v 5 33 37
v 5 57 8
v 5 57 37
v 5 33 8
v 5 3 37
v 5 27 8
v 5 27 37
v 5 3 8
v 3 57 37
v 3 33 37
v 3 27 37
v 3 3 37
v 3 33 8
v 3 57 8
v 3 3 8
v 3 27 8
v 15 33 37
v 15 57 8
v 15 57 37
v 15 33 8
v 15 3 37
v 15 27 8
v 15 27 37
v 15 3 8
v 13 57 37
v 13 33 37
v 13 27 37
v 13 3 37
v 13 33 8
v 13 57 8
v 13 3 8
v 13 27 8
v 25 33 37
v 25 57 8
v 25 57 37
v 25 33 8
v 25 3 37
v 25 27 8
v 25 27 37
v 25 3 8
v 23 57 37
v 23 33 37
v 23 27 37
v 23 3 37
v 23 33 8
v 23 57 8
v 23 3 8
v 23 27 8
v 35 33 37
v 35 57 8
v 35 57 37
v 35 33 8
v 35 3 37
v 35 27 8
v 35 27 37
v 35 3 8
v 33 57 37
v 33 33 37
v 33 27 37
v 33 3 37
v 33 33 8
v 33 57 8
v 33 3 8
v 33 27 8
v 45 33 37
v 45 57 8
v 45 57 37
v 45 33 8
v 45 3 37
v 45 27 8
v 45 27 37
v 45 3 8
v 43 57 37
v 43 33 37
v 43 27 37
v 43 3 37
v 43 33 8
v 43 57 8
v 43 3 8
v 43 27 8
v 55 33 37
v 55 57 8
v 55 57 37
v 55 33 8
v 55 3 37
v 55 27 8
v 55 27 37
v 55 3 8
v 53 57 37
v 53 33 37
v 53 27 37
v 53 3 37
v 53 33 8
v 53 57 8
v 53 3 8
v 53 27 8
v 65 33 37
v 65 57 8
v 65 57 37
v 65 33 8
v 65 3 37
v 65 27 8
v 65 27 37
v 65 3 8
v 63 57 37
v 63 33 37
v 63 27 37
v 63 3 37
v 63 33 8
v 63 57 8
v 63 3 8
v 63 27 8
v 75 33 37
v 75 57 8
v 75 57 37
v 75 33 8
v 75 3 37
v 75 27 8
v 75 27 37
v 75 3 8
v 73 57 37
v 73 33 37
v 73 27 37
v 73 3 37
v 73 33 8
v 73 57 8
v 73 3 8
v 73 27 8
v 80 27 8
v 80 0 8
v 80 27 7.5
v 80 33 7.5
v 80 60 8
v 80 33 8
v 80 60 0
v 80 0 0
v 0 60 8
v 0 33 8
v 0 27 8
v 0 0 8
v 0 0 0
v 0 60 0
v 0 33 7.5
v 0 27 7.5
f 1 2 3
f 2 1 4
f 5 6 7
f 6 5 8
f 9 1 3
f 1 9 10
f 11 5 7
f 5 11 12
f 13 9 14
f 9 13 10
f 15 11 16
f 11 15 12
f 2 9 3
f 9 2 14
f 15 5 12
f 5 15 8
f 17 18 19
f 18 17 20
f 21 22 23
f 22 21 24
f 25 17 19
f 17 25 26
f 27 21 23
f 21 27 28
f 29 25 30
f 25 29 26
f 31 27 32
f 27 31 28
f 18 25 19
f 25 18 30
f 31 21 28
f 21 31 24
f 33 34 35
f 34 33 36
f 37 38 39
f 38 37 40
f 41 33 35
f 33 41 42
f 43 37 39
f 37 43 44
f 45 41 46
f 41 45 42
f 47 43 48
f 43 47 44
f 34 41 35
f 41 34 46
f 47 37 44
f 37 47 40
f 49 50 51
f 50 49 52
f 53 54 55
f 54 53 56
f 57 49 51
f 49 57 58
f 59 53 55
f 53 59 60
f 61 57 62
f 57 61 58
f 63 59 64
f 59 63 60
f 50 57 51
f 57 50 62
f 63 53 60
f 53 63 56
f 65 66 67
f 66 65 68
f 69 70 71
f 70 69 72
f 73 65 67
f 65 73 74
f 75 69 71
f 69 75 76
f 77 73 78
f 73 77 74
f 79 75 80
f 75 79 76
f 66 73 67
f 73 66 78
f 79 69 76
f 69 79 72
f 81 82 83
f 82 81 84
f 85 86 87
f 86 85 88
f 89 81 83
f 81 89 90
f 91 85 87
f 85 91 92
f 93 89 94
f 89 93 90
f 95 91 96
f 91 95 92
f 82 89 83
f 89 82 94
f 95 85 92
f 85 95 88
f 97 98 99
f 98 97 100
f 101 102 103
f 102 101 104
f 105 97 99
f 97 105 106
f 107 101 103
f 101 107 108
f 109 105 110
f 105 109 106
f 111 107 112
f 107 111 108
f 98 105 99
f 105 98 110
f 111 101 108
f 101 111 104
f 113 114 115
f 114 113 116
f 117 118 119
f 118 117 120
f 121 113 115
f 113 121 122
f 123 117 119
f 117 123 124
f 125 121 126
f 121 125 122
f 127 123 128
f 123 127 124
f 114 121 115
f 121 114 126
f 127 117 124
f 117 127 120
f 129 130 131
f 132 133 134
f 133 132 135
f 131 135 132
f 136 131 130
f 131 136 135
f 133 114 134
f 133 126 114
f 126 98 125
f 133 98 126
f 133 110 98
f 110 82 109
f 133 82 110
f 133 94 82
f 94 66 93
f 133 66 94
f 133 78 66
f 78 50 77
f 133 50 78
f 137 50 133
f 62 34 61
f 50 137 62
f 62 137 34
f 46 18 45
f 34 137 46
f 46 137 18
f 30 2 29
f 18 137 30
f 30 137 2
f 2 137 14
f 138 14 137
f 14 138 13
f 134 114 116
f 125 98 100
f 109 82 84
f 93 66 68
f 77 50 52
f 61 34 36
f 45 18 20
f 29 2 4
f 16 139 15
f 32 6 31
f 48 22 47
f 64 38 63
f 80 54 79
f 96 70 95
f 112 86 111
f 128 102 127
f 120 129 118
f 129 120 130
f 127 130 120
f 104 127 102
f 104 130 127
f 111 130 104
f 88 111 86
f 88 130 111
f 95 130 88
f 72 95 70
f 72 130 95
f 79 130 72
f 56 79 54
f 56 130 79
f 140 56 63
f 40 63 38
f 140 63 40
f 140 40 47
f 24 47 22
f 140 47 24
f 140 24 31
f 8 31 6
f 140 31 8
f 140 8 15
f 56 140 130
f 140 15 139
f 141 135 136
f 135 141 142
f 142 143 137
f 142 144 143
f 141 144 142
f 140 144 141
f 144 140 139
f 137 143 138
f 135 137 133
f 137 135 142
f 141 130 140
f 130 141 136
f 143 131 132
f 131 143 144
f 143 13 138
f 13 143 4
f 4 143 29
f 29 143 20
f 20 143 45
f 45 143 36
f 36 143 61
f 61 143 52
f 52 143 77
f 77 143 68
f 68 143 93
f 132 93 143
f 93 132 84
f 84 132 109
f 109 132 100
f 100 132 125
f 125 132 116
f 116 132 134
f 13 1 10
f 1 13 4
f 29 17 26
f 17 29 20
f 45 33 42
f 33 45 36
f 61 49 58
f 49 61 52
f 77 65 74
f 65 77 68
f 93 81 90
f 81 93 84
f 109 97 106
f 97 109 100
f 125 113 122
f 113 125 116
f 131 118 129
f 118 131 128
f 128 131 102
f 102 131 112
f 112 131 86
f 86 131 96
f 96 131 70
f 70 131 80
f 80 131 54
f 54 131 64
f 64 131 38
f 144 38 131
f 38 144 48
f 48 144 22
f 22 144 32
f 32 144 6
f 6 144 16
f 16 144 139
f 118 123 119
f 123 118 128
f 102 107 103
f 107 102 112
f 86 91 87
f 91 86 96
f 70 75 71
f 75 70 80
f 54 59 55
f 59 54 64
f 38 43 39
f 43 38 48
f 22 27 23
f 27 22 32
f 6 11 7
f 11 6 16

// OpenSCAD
$fn = 32;

// ----------------------------------------------------------------------
// Heatsink: slotted fin block
// ----------------------------------------------------------------------

// --- parameters (mm) ---
base_l = 80;              // base length, X
base_w = 60;              // base width, Y
base_t = 8;               // base plate thickness
fin_h = 30;               // fin height above the base
fin_t = 2;                // fin thickness
edge = 3;                 // margin from the base ends
pitch = 10;               // fin pitch
slot_w = 6;               // central slot width, Y

n_fins = floor((base_l - 2 * edge - fin_t) / pitch) + 1;  // fin count
total_h = base_t + fin_h - 1;  // overall height

difference() {
union() {
  cube([base_l, base_w, base_t]);
  for (i = [0 : n_fins - 1])
    translate([edge + i * pitch, edge, base_t - 1])
      cube([fin_t, base_w - 2 * edge, fin_h]);
}
  translate([-1, base_w / 2 - slot_w / 2, base_t - 0.5])
    cube([base_l + 2, slot_w, fin_h + 2]);
}
